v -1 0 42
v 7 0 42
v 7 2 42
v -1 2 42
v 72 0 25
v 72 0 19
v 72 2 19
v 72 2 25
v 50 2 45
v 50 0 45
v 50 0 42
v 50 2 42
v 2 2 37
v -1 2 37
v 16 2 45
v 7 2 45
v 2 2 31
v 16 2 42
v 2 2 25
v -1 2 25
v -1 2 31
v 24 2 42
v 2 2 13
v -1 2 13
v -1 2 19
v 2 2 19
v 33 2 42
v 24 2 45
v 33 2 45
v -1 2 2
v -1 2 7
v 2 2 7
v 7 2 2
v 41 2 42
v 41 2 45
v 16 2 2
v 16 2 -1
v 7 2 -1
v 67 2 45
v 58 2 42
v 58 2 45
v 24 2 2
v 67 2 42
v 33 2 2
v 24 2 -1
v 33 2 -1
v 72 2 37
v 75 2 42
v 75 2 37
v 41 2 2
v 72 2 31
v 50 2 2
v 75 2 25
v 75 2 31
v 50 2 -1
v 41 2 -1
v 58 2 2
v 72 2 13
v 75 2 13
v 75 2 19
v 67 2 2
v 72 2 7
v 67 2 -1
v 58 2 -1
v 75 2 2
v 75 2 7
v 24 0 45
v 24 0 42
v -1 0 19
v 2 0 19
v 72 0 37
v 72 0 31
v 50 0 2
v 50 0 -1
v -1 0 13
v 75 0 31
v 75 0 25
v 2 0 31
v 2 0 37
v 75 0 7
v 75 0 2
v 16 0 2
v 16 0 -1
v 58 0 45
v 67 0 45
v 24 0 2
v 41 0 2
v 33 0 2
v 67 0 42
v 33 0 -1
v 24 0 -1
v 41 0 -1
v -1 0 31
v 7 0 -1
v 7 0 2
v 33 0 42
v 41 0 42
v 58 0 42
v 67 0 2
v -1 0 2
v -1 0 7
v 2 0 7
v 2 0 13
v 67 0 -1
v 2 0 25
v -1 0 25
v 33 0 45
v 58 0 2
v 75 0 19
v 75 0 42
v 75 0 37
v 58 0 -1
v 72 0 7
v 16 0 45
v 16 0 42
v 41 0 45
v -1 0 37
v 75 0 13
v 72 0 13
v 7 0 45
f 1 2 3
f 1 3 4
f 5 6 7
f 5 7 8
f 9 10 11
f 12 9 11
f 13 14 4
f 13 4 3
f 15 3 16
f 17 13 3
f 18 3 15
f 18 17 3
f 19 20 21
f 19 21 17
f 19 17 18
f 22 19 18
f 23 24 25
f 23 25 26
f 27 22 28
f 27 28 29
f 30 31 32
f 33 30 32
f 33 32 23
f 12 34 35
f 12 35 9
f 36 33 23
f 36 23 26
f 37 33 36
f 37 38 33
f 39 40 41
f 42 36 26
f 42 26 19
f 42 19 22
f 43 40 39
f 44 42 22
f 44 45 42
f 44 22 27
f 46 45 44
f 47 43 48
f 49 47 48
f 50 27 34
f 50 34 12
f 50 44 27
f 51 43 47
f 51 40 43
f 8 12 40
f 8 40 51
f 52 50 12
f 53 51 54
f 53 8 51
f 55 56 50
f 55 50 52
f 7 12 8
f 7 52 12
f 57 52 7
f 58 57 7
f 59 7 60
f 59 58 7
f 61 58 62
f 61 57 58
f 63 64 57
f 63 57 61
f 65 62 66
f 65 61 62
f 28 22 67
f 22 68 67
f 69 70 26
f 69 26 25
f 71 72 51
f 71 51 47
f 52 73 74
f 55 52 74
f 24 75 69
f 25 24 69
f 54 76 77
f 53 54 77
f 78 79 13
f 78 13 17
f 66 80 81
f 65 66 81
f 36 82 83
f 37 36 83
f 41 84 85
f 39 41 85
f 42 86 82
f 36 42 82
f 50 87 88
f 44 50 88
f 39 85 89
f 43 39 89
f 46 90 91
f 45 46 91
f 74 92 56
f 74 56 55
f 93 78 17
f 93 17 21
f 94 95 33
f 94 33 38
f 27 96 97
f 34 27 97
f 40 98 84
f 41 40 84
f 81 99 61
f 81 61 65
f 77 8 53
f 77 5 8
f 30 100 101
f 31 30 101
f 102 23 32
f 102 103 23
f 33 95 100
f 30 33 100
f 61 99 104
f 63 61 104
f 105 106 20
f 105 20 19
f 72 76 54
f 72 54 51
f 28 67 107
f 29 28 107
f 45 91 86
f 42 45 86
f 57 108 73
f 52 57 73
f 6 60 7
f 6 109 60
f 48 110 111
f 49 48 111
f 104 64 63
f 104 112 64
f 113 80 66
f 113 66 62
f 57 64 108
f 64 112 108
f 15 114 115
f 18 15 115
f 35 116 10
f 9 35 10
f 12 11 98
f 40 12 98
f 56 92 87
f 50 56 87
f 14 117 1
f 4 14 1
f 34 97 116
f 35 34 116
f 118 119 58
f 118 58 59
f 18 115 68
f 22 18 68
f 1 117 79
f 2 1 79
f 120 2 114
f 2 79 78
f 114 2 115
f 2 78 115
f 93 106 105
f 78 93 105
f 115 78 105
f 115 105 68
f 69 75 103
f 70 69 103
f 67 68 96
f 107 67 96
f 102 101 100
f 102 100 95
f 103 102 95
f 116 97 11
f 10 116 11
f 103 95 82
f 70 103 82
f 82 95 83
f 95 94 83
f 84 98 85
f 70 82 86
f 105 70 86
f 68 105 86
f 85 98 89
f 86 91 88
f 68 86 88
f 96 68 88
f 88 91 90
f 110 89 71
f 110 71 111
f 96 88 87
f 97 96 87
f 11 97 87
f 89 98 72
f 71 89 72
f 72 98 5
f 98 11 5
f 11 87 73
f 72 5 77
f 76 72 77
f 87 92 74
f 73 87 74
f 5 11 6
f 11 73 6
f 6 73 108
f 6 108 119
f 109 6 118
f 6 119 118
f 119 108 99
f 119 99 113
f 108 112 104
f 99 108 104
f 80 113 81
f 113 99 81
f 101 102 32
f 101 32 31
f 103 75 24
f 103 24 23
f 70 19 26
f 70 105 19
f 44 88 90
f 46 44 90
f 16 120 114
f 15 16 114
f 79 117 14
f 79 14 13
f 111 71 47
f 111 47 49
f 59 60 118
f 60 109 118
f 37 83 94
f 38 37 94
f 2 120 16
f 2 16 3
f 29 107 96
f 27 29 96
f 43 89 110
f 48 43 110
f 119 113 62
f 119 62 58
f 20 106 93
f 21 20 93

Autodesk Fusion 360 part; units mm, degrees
sketch "スケッチ1" plane through (0, 0, 0) normal (0, 1, 0) x (1, 0, 0)
  line L0 (0, 0) -> (74, 0)
  line L1 (74, 0) -> (74, -44)
  line L2 (74, -44) -> (0, -44)
  line L3 (0, -44) -> (0, 0)
  dimension "d1" = 74
  dimension "d2" = 44
extrude "押し出し1" add sketch "スケッチ1" along normal blind 2
sketch "スケッチ2" plane through (0, 0, 0) normal (0, -1, 0) x (1, 0, 0)
  line L0 (74, 44) -> (0, 44)
  line L1 (0, 44) -> (0, 0)
  line L2 (0, 0) -> (74, 0)
  line L3 (74, 0) -> (74, 44)
  line L4 (72, 37) -> (74, 37)
  line L5 (74, 37) -> (74, 31)
  line L6 (74, 31) -> (72, 31)
  line L7 (72, 31) -> (72, 37)
  line L8 (74, 25) -> (74, 19)
  line L9 (74, 19) -> (72, 19)
  line L10 (72, 19) -> (72, 25)
  line L11 (72, 25) -> (74, 25)
  line L12 (74, 13) -> (74, 7)
  line L13 (74, 7) -> (72, 7)
  line L14 (72, 7) -> (72, 13)
  line L15 (72, 13) -> (74, 13)
  line L16 (2, 25) -> (2, 19)
  line L17 (2, 31) -> (0, 31)
  line L18 (2, 37) -> (2, 31)
  line L19 (0, 25) -> (2, 25)
  line L20 (2, 13) -> (2, 7)
  line L21 (0, 19) -> (0, 25)
  line L22 (0, 13) -> (2, 13)
  line L23 (2, 7) -> (0, 7)
  line L24 (0, 31) -> (0, 37)
  line L25 (0, 37) -> (2, 37)
  line L26 (0, 7) -> (0, 13)
  line L27 (2, 19) -> (0, 19)
  line L28 (74, 44) -> (72, 44)
  line L29 (72, 44) -> (72, 42)
  line L30 (72, 42) -> (74, 42)
  line L31 (74, 42) -> (74, 44)
  line L32 (0, 44) -> (2, 44)
  line L33 (2, 44) -> (2, 42)
  line L34 (2, 42) -> (0, 42)
  line L35 (0, 42) -> (0, 44)
  line L36 (0, 0) -> (2, 0)
  line L37 (2, 0) -> (2, 2)
  line L38 (2, 2) -> (0, 2)
  line L39 (0, 2) -> (0, 0)
  line L40 (74, 0) -> (72, 0)
  line L41 (72, 0) -> (72, 2)
  line L42 (72, 2) -> (74, 2)
  line L43 (74, 2) -> (74, 0)
  dimension "d7" = 0
  dimension "d8" = -12
  dimension "d9" = 2
  dimension "d10" = 7
  dimension "d11" = 6
  dimension "d12" = 6
  dimension "d13" = 7
  dimension "d16" = -72
  dimension "d17" = 0
extrude "押し出し2" cut sketch "スケッチ2" against normal blind 2 contours L0 L3 L28 L29 L30 L31 | L0 L1 L32 L33 L34 L35 | L3 L4 L5 L6 L7 | L3 L8 L9 L10 L11 | L1 L17 L18 L24 L25 | L3 L12 L13 L14 L15 | L1 L16 L19 L21 L27 | L2 L3 L40 L41 L42 L43 | L1 L20 L22 L23 L26 | L1 L2 L36 L37 L38 L39
sketch "スケッチ3" plane through (0, 0, 0) normal (0, -1, 0) x (1, 0, 0)
  line L0 (74, 31) -> (72, 31)
  line L1 (72, 31) -> (72, 37)
  line L2 (72, 37) -> (74, 37)
  line L3 (74, 37) -> (74, 42)
  line L4 (74, 42) -> (72, 42)
  line L5 (72, 42) -> (72, 44)
  line L6 (72, 44) -> (2, 44)
  line L7 (2, 44) -> (2, 42)
  line L8 (2, 42) -> (0, 42)
  line L9 (0, 42) -> (0, 37)
  line L10 (0, 37) -> (2, 37)
  line L11 (2, 37) -> (2, 31)
  line L12 (2, 31) -> (0, 31)
  line L13 (0, 31) -> (0, 25)
  line L14 (0, 25) -> (2, 25)
  line L15 (2, 25) -> (2, 19)
  line L16 (2, 19) -> (0, 19)
  line L17 (0, 19) -> (0, 13)
  line L18 (0, 13) -> (2, 13)
  line L19 (2, 13) -> (2, 7)
  line L20 (2, 7) -> (0, 7)
  line L21 (0, 7) -> (0, 2)
  line L22 (0, 2) -> (2, 2)
  line L23 (2, 2) -> (2, 0)
  line L24 (2, 0) -> (72, 0)
  line L25 (72, 0) -> (72, 2)
  line L26 (72, 2) -> (74, 2)
  line L27 (74, 2) -> (74, 7)
  line L28 (74, 7) -> (72, 7)
  line L29 (72, 7) -> (72, 13)
  line L30 (72, 13) -> (74, 13)
  line L31 (74, 13) -> (74, 19)
  line L32 (74, 19) -> (72, 19)
  line L33 (72, 19) -> (72, 25)
  line L34 (72, 25) -> (74, 25)
  line L35 (74, 25) -> (74, 31)
  line L36 (0, 44) -> (7, 44)
  line L37 (7, 44) -> (7, 42)
  line L38 (7, 42) -> (0, 42)
  line L39 (0, 42) -> (0, 44)
  line L40 (16, 42) -> (24, 42)
  line L41 (24, 42) -> (24, 44)
  line L42 (24, 44) -> (16, 44)
  line L43 (16, 44) -> (16, 42)
  line L44 (41, 42) -> (41, 44)
  line L45 (33, 42) -> (41, 42)
  line L46 (41, 44) -> (33, 44)
  line L47 (33, 44) -> (33, 42)
  line L48 (58, 42) -> (58, 44)
  line L49 (50, 42) -> (58, 42)
  line L50 (58, 44) -> (50, 44)
  line L51 (50, 44) -> (50, 42)
  line L52 (67, 42) -> (74, 42)
  line L53 (74, 42) -> (74, 44)
  line L54 (74, 44) -> (67, 44)
  line L55 (67, 44) -> (67, 42)
  line L56 (7, 0) -> (0, 0)
  line L57 (41, 2) -> (33, 2)
  line L58 (33, 2) -> (33, 0)
  line L59 (50, 2) -> (50, 0)
  line L60 (24, 2) -> (16, 2)
  line L61 (24, 0) -> (24, 2)
  line L62 (16, 0) -> (24, 0)
  line L63 (7, 2) -> (7, 0)
  line L64 (50, 0) -> (58, 0)
  line L65 (67, 2) -> (67, 0)
  line L66 (0, 0) -> (0, 2)
  line L67 (74, 2) -> (67, 2)
  line L68 (41, 0) -> (41, 2)
  line L69 (58, 2) -> (50, 2)
  line L70 (16, 2) -> (16, 0)
  line L71 (33, 0) -> (41, 0)
  line L72 (67, 0) -> (74, 0)
  line L73 (58, 0) -> (58, 2)
  line L74 (0, 2) -> (7, 2)
  line L75 (74, 0) -> (74, 2)
  line L76 (72, 0) -> (72, 2)
  line L77 (74, 0) -> (72, 0)
  line L78 (2, 2) -> (2, 0)
  line L79 (2, 0) -> (0, 0)
  dimension "d20" = 8
  dimension "d21" = 2
  dimension "d22" = 2
  dimension "d23" = 9
  dimension "d26" = 17
  dimension "d27" = 0
  dimension "d28" = 2
  dimension "d29" = 9
extrude "押し出し3" cut sketch "スケッチ3" against normal blind 2 contours L4 L5 L52 L53 L54 | L5 L6 L52 L54 L55 | L6 L48 L49 L50 L51 | L25 L26 L67 L72 L75 L76 L77 | L6 L44 L45 L46 L47 | L24 L25 L65 L67 L72 L76 | L6 L40 L41 L42 L43 | L24 L59 L64 L69 L73 | L6 L7 L36 L37 L38 | L7 L8 L36 L38 L39 | L24 L57 L58 L68 L71 | L24 L60 L61 L62 L70 | L23 L24 L56 L63 L74 L78 | L22 L23 L56 L66 L74 L78 L79
sketch "スケッチ4" plane through (0, 0, 0) normal (0, -1, 0) x (1, 0, 0)
  line L0 (41, 2) -> (41, 0)
  line L1 (41, 0) -> (50, 0)
  line L2 (50, 0) -> (50, 2)
  line L3 (50, 2) -> (58, 2)
  line L4 (58, 2) -> (58, 0)
  line L5 (58, 0) -> (67, 0)
  line L6 (67, 0) -> (67, 2)
  line L7 (67, 2) -> (74, 2)
  line L8 (74, 2) -> (74, 7)
  line L9 (74, 7) -> (72, 7)
  line L10 (72, 7) -> (72, 13)
  line L11 (72, 13) -> (74, 13)
  line L12 (74, 13) -> (74, 19)
  line L13 (74, 19) -> (72, 19)
  line L14 (72, 19) -> (72, 25)
  line L15 (72, 25) -> (74, 25)
  line L16 (74, 25) -> (74, 31)
  line L17 (74, 31) -> (72, 31)
  line L18 (72, 31) -> (72, 37)
  line L19 (72, 37) -> (74, 37)
  line L20 (74, 37) -> (74, 42)
  line L21 (74, 42) -> (67, 42)
  line L22 (67, 42) -> (67, 44)
  line L23 (67, 44) -> (58, 44)
  line L24 (58, 44) -> (58, 42)
  line L25 (58, 42) -> (50, 42)
  line L26 (50, 42) -> (50, 44)
  line L27 (50, 44) -> (41, 44)
  line L28 (41, 44) -> (41, 42)
  line L29 (41, 42) -> (33, 42)
  line L30 (33, 42) -> (33, 44)
  line L31 (33, 44) -> (24, 44)
  line L32 (24, 44) -> (24, 42)
  line L33 (24, 42) -> (16, 42)
  line L34 (16, 42) -> (16, 44)
  line L35 (16, 44) -> (7, 44)
  line L36 (7, 44) -> (7, 42)
  line L37 (7, 42) -> (0, 42)
  line L38 (0, 42) -> (0, 37)
  line L39 (0, 37) -> (2, 37)
  line L40 (2, 37) -> (2, 31)
  line L41 (2, 31) -> (0, 31)
  line L42 (0, 31) -> (0, 25)
  line L43 (0, 25) -> (2, 25)
  line L44 (2, 25) -> (2, 19)
  line L45 (2, 19) -> (0, 19)
  line L46 (0, 19) -> (0, 13)
  line L47 (0, 13) -> (2, 13)
  line L48 (2, 13) -> (2, 7)
  line L49 (2, 7) -> (0, 7)
  line L50 (0, 7) -> (0, 2)
  line L51 (0, 2) -> (7, 2)
  line L52 (7, 2) -> (7, 0)
  line L53 (7, 0) -> (16, 0)
  line L54 (16, 0) -> (16, 2)
  line L55 (16, 2) -> (24, 2)
  line L56 (24, 2) -> (24, 0)
  line L57 (24, 0) -> (33, 0)
  line L58 (33, 0) -> (33, 2)
  line L59 (33, 2) -> (41, 2)
  line L60 (7, 45) -> (16, 45)
  line L61 (16, 45) -> (16, 44)
  line L62 (16, 44) -> (7, 44)
  line L63 (7, 44) -> (7, 45)
  line L64 (24, 45) -> (33, 45)
  line L65 (33, 45) -> (33, 44)
  line L66 (33, 44) -> (24, 44)
  line L67 (24, 44) -> (24, 45)
  line L68 (41, 45) -> (50, 45)
  line L69 (50, 45) -> (50, 44)
  line L70 (50, 44) -> (41, 44)
  line L71 (41, 44) -> (41, 45)
  line L72 (58, 45) -> (67, 45)
  line L73 (67, 45) -> (67, 44)
  line L74 (67, 44) -> (58, 44)
  line L75 (58, 44) -> (58, 45)
  line L76 (74, 42) -> (75, 42)
  line L77 (75, 42) -> (75, 37)
  line L78 (75, 37) -> (74, 37)
  line L79 (74, 37) -> (74, 42)
  line L80 (74, 31) -> (75, 31)
  line L81 (75, 31) -> (75, 25)
  line L82 (75, 25) -> (74, 25)
  line L83 (74, 25) -> (74, 31)
  line L84 (74, 19) -> (75, 19)
  line L85 (75, 19) -> (75, 13)
  line L86 (75, 13) -> (74, 13)
  line L87 (74, 13) -> (74, 19)
  line L88 (74, 7) -> (75, 7)
  line L89 (75, 7) -> (75, 2)
  line L90 (75, 2) -> (74, 2)
  line L91 (74, 2) -> (74, 7)
  line L92 (58, -1) -> (67, -1)
  line L93 (67, -1) -> (67, 0)
  line L94 (67, 0) -> (58, 0)
  line L95 (58, 0) -> (58, -1)
  line L96 (41, -1) -> (50, -1)
  line L97 (50, -1) -> (50, 0)
  line L98 (50, 0) -> (41, 0)
  line L99 (41, 0) -> (41, -1)
  line L100 (24, 0) -> (33, 0)
  line L101 (33, 0) -> (33, -1)
  line L102 (33, -1) -> (24, -1)
  line L103 (24, -1) -> (24, 0)
  line L104 (16, -1) -> (7, -1)
  line L105 (7, -1) -> (7, 0)
  line L106 (7, 0) -> (16, 0)
  line L107 (16, 0) -> (16, -1)
  line L108 (0, 2) -> (-1, 2)
  line L109 (-1, 2) -> (-1, 7)
  line L110 (-1, 7) -> (0, 7)
  line L111 (0, 7) -> (0, 2)
  line L112 (0, 13) -> (-1, 13)
  line L113 (-1, 13) -> (-1, 19)
  line L114 (-1, 19) -> (0, 19)
  line L115 (0, 19) -> (0, 13)
  line L116 (0, 25) -> (-1, 25)
  line L117 (-1, 25) -> (-1, 31)
  line L118 (-1, 31) -> (0, 31)
  line L119 (0, 31) -> (0, 25)
  line L120 (0, 37) -> (-1, 37)
  line L121 (-1, 37) -> (-1, 42)
  line L122 (-1, 42) -> (0, 42)
  line L123 (0, 42) -> (0, 37)
extrude "押し出し4" add sketch "スケッチ4" against normal blind 2 contours L1 L96 L97 L98 L99 | L57 L100 L101 L102 L103 | L5 L92 L93 L94 L95 | L53 L104 L105 L106 L107 | L8 L88 L89 L90 L91 | L50 L108 L109 L110 L111 | L12 L84 L85 L86 L87 | L46 L112 L113 L114 L115 | L16 L80 L81 L82 L83 | L42 L116 L117 L118 L119 | L20 L76 L77 L78 L79 | L38 L120 L121 L122 L123 | L23 L72 L73 L74 L75 | L35 L60 L61 L62 L63 | L27 L68 L69 L70 L71 | L31 L64 L65 L66 L67
sketch "スケッチ5" plane through (0, 0, 0) normal (0, -1, 0) x (1, 0, 0)
  line L0 (41, 2) -> (41, -1)
  line L1 (41, -1) -> (50, -1)
  line L2 (50, -1) -> (50, 2)
  line L3 (50, 2) -> (58, 2)
  line L4 (58, 2) -> (58, -1)
  line L5 (58, -1) -> (67, -1)
  line L6 (67, -1) -> (67, 2)
  line L7 (67, 2) -> (75, 2)
  line L8 (75, 2) -> (75, 7)
  line L9 (75, 7) -> (72, 7)
  line L10 (72, 7) -> (72, 13)
  line L11 (72, 13) -> (75, 13)
  line L12 (75, 13) -> (75, 19)
  line L13 (75, 19) -> (72, 19)
  line L14 (72, 19) -> (72, 25)
  line L15 (72, 25) -> (75, 25)
  line L16 (75, 25) -> (75, 31)
  line L17 (75, 31) -> (72, 31)
  line L18 (72, 31) -> (72, 37)
  line L19 (72, 37) -> (75, 37)
  line L20 (75, 37) -> (75, 42)
  line L21 (75, 42) -> (67, 42)
  line L22 (67, 42) -> (67, 45)
  line L23 (67, 45) -> (58, 45)
  line L24 (58, 45) -> (58, 42)
  line L25 (58, 42) -> (50, 42)
  line L26 (50, 42) -> (50, 45)
  line L27 (50, 45) -> (41, 45)
  line L28 (41, 45) -> (41, 42)
  line L29 (41, 42) -> (33, 42)
  line L30 (33, 42) -> (33, 45)
  line L31 (33, 45) -> (24, 45)
  line L32 (24, 45) -> (24, 42)
  line L33 (24, 42) -> (16, 42)
  line L34 (16, 42) -> (16, 45)
  line L35 (16, 45) -> (7, 45)
  line L36 (7, 45) -> (7, 42)
  line L37 (7, 42) -> (-1, 42)
  line L38 (-1, 42) -> (-1, 37)
  line L39 (-1, 37) -> (2, 37)
  line L40 (2, 37) -> (2, 31)
  line L41 (2, 31) -> (-1, 31)
  line L42 (-1, 31) -> (-1, 25)
  line L43 (-1, 25) -> (2, 25)
  line L44 (2, 25) -> (2, 19)
  line L45 (2, 19) -> (-1, 19)
  line L46 (-1, 19) -> (-1, 13)
  line L47 (-1, 13) -> (2, 13)
  line L48 (2, 13) -> (2, 7)
  line L49 (2, 7) -> (-1, 7)
  line L50 (-1, 7) -> (-1, 2)
  line L51 (-1, 2) -> (7, 2)
  line L52 (7, 2) -> (7, -1)
  line L53 (7, -1) -> (16, -1)
  line L54 (16, -1) -> (16, 2)
  line L55 (16, 2) -> (24, 2)
  line L56 (24, 2) -> (24, -1)
  line L57 (24, -1) -> (33, -1)
  line L58 (33, -1) -> (33, 2)
  line L59 (33, 2) -> (41, 2)
